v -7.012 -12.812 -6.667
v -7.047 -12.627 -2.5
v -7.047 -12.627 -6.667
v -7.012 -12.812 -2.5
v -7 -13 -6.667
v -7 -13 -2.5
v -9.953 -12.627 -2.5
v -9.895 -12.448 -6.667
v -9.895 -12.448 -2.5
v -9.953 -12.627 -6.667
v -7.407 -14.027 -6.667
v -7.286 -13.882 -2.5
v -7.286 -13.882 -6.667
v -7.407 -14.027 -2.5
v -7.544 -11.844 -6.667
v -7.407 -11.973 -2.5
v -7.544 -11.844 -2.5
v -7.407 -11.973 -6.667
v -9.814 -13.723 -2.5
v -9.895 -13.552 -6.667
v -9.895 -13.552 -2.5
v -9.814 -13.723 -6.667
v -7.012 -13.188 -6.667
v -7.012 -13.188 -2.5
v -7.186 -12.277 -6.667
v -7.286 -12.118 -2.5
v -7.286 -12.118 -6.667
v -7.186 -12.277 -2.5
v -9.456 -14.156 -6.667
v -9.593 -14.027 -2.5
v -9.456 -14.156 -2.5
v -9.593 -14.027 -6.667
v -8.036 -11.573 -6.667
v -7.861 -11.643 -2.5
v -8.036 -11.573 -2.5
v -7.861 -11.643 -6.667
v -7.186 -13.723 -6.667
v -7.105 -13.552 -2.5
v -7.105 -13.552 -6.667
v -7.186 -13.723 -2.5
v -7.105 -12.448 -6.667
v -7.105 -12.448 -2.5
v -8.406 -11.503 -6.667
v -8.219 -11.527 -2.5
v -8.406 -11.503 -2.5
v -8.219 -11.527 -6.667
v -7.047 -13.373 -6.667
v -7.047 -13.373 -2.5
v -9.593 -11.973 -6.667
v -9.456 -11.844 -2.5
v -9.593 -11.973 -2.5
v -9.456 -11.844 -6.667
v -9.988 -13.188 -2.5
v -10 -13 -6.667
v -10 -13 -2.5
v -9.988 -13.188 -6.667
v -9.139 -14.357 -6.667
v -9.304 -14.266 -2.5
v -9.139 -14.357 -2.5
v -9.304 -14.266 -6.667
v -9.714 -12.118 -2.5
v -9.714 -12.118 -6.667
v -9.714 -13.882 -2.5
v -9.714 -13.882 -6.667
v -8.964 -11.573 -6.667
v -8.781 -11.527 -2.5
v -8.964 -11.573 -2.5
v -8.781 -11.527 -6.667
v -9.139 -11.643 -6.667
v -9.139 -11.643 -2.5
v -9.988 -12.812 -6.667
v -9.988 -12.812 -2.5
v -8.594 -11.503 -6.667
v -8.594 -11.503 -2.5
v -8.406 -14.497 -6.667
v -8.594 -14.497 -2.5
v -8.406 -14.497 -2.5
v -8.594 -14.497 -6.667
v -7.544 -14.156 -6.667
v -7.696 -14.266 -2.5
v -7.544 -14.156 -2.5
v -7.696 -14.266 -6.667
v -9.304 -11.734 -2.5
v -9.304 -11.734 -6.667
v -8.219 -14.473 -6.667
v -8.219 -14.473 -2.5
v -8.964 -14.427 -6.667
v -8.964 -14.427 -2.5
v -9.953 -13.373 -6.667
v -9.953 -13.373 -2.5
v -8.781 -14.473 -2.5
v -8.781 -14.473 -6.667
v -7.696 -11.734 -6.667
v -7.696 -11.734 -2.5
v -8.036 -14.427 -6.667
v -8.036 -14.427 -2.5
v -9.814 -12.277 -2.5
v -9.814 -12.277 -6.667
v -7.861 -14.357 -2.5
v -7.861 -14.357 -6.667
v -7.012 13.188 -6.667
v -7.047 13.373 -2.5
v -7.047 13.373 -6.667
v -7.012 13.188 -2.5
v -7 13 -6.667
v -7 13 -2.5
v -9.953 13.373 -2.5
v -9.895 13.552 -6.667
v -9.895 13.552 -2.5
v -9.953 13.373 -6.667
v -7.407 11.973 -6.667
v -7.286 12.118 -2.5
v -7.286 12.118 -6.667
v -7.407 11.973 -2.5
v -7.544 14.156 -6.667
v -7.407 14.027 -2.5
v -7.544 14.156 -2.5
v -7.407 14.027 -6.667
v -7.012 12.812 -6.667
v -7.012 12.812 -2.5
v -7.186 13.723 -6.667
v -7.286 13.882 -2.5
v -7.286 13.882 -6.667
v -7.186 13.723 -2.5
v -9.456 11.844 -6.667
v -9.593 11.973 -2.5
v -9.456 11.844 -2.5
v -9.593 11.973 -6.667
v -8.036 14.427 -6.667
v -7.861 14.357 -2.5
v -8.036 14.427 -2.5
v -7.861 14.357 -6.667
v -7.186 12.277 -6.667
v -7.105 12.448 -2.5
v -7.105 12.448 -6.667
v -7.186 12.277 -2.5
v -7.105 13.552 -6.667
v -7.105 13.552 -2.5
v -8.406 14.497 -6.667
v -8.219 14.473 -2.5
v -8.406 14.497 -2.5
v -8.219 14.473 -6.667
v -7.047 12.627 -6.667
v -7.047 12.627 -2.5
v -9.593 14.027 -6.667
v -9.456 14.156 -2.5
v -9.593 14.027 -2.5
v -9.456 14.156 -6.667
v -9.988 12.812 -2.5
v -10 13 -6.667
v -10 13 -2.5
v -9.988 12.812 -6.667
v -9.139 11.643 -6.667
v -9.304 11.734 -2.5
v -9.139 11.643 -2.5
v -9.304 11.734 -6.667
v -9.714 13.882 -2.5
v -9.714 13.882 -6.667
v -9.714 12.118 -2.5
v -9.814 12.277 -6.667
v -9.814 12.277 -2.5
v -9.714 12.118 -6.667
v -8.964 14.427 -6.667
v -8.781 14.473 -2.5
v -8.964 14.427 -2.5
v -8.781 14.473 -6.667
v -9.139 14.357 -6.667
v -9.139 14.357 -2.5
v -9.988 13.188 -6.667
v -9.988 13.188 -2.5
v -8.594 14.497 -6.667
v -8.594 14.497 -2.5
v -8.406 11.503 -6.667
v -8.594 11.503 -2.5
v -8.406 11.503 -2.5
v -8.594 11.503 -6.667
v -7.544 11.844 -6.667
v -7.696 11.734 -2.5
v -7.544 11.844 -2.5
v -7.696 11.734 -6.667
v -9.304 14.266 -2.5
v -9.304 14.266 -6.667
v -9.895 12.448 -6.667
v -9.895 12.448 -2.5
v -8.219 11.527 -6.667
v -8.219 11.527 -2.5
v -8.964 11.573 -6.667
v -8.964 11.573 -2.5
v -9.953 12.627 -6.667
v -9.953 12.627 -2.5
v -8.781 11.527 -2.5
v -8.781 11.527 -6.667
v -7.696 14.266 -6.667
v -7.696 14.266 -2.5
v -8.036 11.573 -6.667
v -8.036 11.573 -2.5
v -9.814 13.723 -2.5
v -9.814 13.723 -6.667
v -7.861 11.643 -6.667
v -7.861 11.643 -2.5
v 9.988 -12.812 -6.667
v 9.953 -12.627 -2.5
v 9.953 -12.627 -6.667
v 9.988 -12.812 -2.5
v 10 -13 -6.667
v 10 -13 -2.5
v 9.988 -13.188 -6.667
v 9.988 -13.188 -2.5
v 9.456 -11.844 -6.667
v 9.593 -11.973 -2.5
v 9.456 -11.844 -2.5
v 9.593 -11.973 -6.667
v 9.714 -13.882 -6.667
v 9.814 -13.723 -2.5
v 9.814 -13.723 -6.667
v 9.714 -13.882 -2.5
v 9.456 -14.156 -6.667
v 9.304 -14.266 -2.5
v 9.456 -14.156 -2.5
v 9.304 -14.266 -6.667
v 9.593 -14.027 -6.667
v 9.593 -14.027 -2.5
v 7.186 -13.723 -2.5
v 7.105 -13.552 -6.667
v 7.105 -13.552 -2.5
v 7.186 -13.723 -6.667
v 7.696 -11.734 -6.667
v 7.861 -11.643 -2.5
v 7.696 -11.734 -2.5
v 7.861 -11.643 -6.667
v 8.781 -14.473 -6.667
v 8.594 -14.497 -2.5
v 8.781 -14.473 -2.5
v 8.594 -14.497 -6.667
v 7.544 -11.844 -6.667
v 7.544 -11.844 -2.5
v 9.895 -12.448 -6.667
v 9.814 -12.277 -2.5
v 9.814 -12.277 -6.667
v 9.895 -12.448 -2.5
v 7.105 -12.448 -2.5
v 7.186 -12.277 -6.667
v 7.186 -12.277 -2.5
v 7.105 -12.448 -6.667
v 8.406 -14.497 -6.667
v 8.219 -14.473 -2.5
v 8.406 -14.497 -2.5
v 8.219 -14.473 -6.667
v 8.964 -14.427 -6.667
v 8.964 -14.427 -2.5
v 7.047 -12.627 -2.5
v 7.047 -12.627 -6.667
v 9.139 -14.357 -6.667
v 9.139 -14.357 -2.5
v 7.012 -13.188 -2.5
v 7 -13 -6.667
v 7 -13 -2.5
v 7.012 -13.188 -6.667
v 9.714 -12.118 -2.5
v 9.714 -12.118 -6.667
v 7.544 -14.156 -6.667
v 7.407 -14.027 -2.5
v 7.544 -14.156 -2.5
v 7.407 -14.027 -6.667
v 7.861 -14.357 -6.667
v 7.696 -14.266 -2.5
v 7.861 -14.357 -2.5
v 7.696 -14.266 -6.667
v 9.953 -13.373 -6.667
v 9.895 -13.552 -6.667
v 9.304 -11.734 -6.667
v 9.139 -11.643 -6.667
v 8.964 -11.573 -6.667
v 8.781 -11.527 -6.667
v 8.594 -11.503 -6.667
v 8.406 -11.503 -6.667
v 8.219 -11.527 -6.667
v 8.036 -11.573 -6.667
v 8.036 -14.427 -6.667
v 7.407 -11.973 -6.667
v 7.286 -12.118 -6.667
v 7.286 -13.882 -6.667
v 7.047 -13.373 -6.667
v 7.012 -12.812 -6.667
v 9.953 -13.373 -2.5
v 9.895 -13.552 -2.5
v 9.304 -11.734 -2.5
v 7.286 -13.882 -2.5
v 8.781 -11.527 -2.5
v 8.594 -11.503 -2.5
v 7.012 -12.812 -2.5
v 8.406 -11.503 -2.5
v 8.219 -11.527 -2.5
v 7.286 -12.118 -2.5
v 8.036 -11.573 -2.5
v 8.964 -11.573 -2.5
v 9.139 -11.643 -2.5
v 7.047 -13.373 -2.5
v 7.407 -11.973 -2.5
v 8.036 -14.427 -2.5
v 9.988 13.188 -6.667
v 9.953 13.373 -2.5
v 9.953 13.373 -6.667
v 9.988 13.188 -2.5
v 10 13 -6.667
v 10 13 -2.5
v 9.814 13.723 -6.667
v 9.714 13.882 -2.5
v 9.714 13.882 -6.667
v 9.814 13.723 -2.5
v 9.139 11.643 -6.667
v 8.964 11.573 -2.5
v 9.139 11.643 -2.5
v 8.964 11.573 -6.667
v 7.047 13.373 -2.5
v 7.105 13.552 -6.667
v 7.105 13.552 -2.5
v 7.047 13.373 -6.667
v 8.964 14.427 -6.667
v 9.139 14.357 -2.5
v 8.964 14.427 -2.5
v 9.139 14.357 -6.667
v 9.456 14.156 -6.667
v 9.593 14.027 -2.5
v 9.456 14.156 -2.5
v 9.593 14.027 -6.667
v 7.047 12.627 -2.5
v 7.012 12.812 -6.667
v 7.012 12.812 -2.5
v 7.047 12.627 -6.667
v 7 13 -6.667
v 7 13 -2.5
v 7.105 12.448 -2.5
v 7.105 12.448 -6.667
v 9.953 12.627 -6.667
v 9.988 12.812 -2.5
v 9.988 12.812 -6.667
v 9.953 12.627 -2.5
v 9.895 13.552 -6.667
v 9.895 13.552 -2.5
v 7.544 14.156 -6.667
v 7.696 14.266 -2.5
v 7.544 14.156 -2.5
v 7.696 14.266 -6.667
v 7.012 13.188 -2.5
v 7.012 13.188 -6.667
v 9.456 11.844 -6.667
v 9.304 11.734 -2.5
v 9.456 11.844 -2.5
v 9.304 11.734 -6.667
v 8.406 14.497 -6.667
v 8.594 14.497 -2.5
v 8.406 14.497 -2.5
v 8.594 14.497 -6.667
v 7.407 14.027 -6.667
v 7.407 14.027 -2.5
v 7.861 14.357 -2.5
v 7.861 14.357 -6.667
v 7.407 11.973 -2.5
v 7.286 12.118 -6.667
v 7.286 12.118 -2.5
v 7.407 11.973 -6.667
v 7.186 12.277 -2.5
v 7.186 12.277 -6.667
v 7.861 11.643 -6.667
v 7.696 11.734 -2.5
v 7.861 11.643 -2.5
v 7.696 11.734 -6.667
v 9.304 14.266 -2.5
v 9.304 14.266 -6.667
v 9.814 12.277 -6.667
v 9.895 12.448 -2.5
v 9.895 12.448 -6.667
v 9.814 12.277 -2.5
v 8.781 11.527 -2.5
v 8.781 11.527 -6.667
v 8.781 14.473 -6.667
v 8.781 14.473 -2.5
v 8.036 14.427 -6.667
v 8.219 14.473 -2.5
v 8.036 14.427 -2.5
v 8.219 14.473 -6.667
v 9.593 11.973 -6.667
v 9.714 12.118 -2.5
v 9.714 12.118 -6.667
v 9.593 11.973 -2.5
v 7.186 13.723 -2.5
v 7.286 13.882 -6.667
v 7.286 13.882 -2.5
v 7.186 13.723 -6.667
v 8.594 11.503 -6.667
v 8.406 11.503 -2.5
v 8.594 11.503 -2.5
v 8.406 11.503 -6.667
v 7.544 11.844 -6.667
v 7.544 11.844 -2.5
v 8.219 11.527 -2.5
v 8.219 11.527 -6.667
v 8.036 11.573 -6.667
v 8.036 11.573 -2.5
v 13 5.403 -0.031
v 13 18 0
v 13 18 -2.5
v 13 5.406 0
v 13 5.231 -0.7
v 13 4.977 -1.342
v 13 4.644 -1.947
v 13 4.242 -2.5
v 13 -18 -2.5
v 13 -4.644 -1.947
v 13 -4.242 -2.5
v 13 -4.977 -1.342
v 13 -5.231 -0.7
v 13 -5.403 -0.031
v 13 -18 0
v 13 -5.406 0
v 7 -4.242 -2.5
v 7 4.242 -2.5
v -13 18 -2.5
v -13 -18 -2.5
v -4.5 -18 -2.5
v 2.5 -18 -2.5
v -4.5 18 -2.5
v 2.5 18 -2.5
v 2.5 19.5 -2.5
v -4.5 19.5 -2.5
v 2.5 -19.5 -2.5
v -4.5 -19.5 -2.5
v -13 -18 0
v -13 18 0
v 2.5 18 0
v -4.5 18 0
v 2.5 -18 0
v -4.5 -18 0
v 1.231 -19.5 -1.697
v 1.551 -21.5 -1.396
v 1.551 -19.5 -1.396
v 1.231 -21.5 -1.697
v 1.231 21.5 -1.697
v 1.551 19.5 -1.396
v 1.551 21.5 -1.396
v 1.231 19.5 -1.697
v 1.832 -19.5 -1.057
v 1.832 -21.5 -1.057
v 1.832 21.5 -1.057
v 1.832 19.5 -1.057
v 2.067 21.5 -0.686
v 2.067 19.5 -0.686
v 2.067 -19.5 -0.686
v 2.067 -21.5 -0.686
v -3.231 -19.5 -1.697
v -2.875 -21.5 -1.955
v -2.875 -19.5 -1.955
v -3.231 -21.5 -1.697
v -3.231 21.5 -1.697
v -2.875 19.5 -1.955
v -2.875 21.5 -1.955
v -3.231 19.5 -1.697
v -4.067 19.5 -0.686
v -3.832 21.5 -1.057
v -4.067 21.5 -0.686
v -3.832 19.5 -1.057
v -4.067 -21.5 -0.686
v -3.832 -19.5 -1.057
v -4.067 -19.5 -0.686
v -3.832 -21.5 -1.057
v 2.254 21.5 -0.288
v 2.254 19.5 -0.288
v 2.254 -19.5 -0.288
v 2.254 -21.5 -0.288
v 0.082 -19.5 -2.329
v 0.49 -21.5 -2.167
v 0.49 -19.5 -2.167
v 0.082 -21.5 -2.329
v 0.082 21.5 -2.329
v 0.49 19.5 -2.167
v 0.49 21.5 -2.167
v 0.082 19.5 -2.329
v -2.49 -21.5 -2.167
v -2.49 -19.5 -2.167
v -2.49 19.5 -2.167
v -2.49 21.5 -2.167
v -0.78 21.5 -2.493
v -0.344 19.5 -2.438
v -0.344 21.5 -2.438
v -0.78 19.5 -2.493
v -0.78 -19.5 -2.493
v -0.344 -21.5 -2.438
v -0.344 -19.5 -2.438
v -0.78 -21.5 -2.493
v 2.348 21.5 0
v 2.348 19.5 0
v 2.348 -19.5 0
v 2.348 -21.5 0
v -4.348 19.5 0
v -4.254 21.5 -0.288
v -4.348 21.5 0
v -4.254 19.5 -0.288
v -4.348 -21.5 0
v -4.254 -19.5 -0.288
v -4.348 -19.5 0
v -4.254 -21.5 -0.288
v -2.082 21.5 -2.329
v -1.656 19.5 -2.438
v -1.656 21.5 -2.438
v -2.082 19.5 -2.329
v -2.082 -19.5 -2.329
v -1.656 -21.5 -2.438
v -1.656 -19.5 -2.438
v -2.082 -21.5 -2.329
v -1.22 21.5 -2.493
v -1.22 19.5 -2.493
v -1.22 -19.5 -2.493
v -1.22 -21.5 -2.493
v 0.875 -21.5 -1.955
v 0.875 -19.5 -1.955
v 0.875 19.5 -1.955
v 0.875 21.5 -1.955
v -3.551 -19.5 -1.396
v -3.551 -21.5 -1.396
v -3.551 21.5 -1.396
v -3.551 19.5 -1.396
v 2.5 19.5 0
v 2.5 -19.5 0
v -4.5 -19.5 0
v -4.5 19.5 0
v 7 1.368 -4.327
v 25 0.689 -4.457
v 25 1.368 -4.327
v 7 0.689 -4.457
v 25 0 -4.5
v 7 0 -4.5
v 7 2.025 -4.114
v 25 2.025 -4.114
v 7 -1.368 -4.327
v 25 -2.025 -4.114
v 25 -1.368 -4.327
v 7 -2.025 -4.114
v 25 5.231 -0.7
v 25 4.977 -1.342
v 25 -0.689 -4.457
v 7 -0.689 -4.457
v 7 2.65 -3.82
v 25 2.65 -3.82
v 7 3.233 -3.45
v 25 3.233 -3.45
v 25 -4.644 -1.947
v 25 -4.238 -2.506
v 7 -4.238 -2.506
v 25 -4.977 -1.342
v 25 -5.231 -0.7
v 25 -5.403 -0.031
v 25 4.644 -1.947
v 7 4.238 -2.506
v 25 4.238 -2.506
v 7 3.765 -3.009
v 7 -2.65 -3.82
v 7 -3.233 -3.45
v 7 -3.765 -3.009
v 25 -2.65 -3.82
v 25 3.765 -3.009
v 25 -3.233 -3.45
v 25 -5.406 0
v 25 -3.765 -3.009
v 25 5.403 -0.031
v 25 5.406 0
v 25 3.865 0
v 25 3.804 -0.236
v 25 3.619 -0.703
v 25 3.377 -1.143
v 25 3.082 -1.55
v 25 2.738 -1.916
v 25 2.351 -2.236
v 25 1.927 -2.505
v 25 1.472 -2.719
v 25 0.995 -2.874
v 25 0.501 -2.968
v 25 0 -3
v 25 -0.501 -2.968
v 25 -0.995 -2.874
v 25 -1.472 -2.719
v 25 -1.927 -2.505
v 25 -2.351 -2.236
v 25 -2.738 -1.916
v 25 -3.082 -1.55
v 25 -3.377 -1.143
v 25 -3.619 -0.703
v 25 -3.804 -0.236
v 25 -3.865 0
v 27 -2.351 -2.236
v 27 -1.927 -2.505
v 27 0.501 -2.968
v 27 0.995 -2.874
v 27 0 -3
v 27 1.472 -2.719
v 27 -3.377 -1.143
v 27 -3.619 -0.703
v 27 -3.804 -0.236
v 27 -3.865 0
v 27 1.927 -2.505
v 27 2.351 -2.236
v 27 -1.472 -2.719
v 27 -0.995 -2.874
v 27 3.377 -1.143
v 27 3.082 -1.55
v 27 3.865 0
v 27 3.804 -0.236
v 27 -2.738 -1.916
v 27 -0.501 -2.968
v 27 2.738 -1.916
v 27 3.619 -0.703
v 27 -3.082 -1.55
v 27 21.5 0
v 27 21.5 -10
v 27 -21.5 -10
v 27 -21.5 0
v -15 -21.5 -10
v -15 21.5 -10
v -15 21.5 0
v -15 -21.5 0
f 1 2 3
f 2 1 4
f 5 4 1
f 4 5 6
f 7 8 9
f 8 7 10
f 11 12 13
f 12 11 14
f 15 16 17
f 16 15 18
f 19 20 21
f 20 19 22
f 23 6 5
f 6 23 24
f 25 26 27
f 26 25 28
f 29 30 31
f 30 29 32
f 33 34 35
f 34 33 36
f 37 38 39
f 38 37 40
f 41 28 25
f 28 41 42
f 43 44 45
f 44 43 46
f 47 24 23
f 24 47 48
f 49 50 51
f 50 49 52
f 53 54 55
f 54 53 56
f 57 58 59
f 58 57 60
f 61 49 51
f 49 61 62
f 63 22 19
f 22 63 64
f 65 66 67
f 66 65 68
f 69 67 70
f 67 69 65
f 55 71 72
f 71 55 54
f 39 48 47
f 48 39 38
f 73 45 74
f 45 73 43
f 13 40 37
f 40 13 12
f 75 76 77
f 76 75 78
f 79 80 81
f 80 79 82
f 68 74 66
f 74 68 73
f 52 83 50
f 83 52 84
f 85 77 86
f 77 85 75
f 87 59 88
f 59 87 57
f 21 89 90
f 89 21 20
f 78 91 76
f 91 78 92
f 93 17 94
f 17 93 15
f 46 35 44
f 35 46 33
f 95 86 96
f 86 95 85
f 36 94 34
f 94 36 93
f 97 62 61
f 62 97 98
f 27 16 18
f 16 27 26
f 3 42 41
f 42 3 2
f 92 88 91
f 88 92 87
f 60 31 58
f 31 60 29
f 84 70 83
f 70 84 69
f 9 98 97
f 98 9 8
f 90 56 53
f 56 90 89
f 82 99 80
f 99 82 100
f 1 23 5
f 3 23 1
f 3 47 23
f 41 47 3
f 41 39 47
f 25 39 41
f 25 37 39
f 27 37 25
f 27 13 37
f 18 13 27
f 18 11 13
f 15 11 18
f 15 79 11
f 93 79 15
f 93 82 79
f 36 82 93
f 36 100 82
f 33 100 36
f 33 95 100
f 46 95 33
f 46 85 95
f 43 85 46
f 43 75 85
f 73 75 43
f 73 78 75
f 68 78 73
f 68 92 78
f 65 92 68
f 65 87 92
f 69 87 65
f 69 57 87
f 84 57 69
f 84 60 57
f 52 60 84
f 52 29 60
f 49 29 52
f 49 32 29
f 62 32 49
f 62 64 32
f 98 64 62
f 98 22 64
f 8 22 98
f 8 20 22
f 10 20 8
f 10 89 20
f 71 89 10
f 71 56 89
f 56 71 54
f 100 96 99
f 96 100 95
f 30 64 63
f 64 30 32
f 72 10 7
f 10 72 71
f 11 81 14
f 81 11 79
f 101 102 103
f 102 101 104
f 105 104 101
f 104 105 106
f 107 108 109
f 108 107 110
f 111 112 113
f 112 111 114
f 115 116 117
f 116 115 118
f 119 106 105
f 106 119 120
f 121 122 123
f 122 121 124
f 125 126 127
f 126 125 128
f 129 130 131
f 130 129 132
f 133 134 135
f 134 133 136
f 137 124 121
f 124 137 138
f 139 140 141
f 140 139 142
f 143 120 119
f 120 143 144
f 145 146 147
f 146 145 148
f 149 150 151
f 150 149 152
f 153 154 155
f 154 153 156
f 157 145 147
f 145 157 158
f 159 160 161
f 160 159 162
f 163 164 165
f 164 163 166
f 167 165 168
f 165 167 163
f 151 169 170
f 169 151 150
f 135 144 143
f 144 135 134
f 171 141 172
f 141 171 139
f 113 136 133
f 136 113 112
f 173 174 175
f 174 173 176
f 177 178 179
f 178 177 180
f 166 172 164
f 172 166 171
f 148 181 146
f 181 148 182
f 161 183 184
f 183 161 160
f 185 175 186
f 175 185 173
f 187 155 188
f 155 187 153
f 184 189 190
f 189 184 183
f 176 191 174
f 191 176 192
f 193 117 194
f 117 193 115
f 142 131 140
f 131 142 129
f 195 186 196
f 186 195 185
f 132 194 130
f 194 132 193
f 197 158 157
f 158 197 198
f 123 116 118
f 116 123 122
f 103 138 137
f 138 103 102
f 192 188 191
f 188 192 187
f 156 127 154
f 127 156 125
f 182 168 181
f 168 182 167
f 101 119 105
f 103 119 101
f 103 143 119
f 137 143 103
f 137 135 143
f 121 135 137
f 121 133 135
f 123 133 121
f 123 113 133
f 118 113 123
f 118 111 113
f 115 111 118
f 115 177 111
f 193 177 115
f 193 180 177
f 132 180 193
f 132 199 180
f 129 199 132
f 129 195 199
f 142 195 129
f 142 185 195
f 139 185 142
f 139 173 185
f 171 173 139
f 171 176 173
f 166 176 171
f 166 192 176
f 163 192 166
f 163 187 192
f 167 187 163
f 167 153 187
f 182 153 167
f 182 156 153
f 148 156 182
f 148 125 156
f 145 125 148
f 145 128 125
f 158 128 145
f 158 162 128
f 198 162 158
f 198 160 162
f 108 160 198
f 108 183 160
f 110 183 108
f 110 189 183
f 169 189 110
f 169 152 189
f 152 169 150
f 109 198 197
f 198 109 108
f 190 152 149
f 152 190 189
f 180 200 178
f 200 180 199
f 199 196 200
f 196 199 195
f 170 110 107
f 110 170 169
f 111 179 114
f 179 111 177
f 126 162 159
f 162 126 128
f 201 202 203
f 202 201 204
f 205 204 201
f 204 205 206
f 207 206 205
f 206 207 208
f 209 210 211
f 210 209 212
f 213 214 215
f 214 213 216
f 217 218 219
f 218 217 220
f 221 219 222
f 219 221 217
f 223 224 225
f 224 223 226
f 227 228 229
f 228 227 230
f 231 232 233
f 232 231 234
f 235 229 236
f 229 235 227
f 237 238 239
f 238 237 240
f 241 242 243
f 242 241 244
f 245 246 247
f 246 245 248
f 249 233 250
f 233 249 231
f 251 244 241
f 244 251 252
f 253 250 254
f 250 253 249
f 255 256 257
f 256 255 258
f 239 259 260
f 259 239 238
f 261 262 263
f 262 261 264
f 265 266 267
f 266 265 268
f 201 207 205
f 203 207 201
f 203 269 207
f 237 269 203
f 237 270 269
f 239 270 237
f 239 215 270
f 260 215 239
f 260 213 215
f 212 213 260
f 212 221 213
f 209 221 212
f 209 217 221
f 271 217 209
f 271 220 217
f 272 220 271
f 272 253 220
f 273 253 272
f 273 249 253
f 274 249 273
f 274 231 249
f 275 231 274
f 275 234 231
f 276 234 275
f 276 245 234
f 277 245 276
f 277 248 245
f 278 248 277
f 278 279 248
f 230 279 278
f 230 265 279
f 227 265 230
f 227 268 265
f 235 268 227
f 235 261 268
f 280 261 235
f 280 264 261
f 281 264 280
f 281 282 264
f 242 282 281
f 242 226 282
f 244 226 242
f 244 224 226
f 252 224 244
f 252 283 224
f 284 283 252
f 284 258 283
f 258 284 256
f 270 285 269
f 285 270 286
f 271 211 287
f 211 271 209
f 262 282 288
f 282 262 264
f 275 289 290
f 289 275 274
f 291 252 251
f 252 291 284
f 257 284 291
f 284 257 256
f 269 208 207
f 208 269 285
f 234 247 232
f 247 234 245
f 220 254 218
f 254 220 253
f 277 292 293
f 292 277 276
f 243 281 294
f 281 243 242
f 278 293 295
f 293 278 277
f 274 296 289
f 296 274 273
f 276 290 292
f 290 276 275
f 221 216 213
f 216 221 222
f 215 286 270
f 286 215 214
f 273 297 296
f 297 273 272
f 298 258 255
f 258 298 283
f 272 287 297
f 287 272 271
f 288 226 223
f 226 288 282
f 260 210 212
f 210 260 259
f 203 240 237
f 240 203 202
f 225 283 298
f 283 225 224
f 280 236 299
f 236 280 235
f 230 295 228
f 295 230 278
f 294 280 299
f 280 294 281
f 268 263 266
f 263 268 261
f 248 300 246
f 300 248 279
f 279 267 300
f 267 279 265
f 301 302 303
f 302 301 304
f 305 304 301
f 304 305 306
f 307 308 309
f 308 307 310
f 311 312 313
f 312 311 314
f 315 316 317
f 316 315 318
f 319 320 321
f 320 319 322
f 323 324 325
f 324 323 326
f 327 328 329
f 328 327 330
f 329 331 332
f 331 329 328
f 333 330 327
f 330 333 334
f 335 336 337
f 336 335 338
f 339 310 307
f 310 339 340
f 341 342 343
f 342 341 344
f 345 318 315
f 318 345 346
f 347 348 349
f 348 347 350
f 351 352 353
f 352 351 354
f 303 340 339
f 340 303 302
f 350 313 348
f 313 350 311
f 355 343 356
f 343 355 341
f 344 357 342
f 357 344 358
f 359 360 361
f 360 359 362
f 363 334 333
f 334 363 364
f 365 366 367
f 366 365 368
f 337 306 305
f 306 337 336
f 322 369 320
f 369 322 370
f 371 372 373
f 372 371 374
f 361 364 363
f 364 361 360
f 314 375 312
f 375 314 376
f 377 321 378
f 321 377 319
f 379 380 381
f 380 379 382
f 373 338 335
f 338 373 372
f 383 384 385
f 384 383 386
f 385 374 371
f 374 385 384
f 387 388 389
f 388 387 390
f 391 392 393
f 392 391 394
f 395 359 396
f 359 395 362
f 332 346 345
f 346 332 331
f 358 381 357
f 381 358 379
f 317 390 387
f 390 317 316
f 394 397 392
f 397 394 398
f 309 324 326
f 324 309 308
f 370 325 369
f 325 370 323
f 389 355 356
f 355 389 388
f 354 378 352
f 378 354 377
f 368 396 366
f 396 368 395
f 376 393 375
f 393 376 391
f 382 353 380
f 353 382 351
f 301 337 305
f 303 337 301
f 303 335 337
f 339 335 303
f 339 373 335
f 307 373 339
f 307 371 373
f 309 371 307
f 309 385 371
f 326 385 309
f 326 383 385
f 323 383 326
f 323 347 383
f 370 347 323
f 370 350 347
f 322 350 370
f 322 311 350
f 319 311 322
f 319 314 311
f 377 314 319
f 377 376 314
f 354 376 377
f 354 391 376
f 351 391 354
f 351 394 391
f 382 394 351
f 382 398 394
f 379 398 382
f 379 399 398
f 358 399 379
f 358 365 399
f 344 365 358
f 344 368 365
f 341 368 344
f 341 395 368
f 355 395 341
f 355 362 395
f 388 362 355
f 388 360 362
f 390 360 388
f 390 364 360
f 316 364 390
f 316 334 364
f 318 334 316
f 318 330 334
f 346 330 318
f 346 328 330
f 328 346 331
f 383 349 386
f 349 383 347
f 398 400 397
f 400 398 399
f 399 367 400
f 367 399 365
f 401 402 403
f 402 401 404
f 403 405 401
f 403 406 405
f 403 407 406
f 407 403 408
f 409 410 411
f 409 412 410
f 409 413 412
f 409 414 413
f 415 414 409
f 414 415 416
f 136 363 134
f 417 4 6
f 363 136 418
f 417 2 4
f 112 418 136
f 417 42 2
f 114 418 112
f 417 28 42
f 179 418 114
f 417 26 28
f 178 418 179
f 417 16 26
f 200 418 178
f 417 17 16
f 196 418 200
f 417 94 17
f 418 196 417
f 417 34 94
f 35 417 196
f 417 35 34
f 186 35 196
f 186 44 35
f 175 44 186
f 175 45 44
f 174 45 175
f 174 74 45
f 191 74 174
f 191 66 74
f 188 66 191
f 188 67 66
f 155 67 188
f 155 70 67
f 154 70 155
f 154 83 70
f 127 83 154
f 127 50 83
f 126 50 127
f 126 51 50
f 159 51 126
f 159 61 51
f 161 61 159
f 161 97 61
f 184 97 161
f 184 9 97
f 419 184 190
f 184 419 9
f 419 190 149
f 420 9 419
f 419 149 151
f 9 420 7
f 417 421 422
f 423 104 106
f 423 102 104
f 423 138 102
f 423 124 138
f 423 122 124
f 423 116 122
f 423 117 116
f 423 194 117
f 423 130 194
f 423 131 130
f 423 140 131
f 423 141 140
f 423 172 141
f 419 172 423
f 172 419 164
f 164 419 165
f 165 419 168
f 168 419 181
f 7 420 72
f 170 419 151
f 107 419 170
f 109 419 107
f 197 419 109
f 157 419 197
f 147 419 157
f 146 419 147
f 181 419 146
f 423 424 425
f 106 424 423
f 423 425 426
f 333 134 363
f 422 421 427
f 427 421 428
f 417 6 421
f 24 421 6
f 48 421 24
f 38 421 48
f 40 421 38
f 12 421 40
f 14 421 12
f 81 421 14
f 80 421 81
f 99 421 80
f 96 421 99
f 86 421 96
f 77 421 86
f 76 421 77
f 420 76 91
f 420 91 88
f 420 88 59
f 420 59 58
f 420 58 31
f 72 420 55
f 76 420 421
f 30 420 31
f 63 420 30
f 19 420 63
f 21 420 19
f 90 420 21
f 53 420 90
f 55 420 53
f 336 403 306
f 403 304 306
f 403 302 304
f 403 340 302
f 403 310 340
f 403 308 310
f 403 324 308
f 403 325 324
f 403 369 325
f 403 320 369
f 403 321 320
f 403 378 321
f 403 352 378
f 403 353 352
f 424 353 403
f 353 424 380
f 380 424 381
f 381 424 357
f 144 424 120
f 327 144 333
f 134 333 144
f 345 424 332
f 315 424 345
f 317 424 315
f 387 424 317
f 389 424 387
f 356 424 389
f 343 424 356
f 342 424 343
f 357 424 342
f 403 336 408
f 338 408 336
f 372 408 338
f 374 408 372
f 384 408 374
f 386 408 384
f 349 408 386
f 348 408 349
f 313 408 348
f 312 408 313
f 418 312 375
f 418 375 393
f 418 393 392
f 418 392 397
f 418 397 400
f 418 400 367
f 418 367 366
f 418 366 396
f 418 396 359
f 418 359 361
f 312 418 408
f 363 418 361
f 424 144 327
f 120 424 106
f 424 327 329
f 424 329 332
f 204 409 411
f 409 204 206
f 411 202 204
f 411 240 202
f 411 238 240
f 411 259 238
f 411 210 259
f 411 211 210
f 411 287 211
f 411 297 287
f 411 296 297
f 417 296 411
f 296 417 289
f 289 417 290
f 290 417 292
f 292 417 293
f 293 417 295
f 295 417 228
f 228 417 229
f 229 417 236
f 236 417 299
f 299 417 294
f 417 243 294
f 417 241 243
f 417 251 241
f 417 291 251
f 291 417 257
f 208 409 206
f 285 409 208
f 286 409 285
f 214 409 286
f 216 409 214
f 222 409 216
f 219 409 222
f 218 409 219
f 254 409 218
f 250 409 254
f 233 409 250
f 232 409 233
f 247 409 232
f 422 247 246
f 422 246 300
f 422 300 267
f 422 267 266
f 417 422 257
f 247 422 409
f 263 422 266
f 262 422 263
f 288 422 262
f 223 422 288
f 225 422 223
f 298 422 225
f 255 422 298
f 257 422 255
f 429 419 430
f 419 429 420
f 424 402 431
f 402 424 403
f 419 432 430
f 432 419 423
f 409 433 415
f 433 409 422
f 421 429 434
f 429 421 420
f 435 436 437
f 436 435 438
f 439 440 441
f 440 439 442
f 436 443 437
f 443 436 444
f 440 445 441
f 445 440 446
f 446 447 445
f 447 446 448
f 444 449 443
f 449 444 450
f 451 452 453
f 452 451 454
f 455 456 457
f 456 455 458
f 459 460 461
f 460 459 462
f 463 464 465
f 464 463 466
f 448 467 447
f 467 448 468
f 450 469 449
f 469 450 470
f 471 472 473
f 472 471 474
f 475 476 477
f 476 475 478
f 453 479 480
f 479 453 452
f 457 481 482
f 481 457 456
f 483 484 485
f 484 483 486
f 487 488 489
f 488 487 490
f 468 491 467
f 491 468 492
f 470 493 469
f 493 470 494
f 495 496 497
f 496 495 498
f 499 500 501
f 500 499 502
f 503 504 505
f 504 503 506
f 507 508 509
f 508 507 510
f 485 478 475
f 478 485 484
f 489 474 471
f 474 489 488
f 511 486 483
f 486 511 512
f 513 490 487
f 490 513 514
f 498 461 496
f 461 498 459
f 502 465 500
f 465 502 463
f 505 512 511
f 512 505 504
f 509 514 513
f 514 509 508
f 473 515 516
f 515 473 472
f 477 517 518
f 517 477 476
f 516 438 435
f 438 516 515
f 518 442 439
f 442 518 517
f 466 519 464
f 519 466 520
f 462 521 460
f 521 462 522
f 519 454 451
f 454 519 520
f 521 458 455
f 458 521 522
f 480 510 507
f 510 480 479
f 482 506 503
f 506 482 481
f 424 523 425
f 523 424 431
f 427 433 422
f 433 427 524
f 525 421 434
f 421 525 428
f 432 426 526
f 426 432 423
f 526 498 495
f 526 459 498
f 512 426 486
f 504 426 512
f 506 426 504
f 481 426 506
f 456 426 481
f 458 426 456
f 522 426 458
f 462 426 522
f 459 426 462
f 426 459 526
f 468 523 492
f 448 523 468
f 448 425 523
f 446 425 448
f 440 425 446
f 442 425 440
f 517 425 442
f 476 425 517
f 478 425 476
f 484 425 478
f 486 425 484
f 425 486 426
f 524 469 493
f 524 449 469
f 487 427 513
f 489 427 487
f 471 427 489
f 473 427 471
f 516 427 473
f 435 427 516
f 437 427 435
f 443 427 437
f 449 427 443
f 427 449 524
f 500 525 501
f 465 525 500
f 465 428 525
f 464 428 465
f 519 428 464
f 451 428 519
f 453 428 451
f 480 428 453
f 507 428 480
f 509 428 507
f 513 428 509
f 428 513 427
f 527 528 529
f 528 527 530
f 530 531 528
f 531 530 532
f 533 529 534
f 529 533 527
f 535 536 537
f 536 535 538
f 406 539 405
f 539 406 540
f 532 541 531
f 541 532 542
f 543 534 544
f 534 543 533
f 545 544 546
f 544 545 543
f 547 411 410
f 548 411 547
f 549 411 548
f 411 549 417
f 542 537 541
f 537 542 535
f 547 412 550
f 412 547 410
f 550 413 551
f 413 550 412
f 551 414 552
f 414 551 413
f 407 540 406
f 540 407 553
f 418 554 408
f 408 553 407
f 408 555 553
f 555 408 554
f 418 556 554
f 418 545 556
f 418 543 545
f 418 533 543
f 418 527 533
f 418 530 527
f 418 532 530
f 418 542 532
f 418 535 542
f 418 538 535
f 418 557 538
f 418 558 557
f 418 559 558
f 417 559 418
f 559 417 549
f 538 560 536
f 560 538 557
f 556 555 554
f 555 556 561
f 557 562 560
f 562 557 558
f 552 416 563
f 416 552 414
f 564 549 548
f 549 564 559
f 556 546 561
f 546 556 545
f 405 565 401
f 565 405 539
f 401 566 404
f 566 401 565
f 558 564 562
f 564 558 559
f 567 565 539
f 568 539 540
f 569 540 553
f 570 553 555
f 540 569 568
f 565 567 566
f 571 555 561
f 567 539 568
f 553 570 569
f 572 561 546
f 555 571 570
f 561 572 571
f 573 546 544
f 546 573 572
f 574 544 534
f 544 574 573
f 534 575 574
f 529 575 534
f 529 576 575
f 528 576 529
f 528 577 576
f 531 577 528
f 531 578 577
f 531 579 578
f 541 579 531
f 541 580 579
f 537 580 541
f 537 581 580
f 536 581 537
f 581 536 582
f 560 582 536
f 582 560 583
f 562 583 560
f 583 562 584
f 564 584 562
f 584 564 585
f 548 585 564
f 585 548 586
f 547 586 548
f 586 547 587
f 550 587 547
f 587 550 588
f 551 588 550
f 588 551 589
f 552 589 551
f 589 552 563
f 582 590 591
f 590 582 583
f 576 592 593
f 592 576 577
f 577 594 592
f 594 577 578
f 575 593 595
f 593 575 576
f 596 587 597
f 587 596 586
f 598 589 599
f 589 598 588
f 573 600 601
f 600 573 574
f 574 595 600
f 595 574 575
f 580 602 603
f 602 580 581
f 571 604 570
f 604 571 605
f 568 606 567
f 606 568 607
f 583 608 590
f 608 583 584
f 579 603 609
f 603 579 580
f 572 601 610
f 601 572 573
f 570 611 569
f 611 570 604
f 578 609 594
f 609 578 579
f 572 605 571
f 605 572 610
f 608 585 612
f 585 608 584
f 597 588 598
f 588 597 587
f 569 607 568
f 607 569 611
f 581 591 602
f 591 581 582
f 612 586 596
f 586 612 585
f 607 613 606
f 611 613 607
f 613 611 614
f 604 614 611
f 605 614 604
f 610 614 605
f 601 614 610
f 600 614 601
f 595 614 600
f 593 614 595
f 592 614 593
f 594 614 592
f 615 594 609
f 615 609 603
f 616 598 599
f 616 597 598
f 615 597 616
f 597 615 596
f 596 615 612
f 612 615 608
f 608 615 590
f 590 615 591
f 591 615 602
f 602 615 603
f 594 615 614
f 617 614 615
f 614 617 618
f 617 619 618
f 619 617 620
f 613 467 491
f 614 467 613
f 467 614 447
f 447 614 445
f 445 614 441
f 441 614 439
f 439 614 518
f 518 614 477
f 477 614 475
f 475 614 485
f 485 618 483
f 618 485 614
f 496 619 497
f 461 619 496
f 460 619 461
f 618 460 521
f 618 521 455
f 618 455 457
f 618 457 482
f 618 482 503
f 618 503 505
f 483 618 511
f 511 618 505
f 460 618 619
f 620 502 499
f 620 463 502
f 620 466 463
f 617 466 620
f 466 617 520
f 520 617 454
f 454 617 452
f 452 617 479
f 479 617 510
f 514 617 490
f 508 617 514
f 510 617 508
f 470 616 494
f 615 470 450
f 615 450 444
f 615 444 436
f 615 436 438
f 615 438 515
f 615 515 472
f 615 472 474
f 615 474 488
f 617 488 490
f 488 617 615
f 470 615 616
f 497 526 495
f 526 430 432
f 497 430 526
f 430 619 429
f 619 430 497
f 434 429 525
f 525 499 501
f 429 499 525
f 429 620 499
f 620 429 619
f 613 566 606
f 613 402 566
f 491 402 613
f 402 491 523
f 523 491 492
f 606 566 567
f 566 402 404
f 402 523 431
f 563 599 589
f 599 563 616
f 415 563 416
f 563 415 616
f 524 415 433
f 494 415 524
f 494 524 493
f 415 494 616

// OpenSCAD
LNA_CONN_DIA = 7;
LNA_CONN_BASE = 1.5;
LNA_CONN_OFFSET_X = -1;
LNA_CONN_OFFSET_Y = 0;
LNA_CONN_OFFSET_Z = 1;
LNA_WIDTH = 26;
LNA_LENGTH = 36;
LNA_THICKNESS = 5;
LNA_HOLE_DIA = 3;
LNA_HOLE_SPACING_WIDTH = 17;
LNA_HOLE_SPACING_LENGTH = 26;

DC_DIA = 11;
DC_JACK_DIA = 8;
DC_LENGTH = 18;
DC_OFFSET_X = -6;
DC_OFFSET_Y = 0;
DC_OFFSET_Z = 1;

THICKNESS = 2;
LENGTH = LNA_LENGTH + 2 * LNA_CONN_BASE + 2 * THICKNESS;
WIDTH = LNA_WIDTH + (DC_LENGTH + DC_OFFSET_X) + 2 * THICKNESS;
HEIGHT = 20;

TOP = false;

$fn = 50;

module lna() {
    union() {
        cube(size = [LNA_WIDTH, LNA_LENGTH, LNA_THICKNESS], center = true);
        
        translate([LNA_CONN_OFFSET_X, LNA_CONN_OFFSET_Y, LNA_CONN_OFFSET_Z])
        rotate([90, 0, 0])
        cylinder(d = LNA_CONN_DIA, h = LNA_LENGTH + 20, center = true);

        translate([LNA_CONN_OFFSET_X, LNA_CONN_OFFSET_Y, LNA_CONN_OFFSET_Z])
        cube(size = [LNA_CONN_DIA, LNA_LENGTH + 2 * LNA_CONN_BASE, LNA_CONN_DIA], center = true);

        for (i = [-1, 1]) {
            for (j = [-1, 1]) {
                translate([i * LNA_HOLE_SPACING_WIDTH/2, j * LNA_HOLE_SPACING_LENGTH/2, -HEIGHT/3])
                cylinder(d = LNA_HOLE_DIA, h = HEIGHT * 2);
            }
        }
    }
}

module dc_jack() {
    translate([LNA_WIDTH/2 + DC_OFFSET_X, DC_OFFSET_Y, DC_OFFSET_Z])
    rotate([0, 90, 0])
    union() {
        cylinder(d = DC_DIA, h = DC_LENGTH);
        cylinder(d = DC_JACK_DIA, h = DC_LENGTH * 2);
    }
}

module case() {
    translate([WIDTH/2 - LNA_WIDTH/2 - THICKNESS, 0, 0])    
    cube(size = [WIDTH, LENGTH, HEIGHT], center = true);
}

intersection() {
    difference() {
        case();
        lna();
        dc_jack();
    }
    
    translate([0, 0, TOP ? 0 : -HEIGHT])
    cylinder(d = 2 * WIDTH, h = HEIGHT);
}
